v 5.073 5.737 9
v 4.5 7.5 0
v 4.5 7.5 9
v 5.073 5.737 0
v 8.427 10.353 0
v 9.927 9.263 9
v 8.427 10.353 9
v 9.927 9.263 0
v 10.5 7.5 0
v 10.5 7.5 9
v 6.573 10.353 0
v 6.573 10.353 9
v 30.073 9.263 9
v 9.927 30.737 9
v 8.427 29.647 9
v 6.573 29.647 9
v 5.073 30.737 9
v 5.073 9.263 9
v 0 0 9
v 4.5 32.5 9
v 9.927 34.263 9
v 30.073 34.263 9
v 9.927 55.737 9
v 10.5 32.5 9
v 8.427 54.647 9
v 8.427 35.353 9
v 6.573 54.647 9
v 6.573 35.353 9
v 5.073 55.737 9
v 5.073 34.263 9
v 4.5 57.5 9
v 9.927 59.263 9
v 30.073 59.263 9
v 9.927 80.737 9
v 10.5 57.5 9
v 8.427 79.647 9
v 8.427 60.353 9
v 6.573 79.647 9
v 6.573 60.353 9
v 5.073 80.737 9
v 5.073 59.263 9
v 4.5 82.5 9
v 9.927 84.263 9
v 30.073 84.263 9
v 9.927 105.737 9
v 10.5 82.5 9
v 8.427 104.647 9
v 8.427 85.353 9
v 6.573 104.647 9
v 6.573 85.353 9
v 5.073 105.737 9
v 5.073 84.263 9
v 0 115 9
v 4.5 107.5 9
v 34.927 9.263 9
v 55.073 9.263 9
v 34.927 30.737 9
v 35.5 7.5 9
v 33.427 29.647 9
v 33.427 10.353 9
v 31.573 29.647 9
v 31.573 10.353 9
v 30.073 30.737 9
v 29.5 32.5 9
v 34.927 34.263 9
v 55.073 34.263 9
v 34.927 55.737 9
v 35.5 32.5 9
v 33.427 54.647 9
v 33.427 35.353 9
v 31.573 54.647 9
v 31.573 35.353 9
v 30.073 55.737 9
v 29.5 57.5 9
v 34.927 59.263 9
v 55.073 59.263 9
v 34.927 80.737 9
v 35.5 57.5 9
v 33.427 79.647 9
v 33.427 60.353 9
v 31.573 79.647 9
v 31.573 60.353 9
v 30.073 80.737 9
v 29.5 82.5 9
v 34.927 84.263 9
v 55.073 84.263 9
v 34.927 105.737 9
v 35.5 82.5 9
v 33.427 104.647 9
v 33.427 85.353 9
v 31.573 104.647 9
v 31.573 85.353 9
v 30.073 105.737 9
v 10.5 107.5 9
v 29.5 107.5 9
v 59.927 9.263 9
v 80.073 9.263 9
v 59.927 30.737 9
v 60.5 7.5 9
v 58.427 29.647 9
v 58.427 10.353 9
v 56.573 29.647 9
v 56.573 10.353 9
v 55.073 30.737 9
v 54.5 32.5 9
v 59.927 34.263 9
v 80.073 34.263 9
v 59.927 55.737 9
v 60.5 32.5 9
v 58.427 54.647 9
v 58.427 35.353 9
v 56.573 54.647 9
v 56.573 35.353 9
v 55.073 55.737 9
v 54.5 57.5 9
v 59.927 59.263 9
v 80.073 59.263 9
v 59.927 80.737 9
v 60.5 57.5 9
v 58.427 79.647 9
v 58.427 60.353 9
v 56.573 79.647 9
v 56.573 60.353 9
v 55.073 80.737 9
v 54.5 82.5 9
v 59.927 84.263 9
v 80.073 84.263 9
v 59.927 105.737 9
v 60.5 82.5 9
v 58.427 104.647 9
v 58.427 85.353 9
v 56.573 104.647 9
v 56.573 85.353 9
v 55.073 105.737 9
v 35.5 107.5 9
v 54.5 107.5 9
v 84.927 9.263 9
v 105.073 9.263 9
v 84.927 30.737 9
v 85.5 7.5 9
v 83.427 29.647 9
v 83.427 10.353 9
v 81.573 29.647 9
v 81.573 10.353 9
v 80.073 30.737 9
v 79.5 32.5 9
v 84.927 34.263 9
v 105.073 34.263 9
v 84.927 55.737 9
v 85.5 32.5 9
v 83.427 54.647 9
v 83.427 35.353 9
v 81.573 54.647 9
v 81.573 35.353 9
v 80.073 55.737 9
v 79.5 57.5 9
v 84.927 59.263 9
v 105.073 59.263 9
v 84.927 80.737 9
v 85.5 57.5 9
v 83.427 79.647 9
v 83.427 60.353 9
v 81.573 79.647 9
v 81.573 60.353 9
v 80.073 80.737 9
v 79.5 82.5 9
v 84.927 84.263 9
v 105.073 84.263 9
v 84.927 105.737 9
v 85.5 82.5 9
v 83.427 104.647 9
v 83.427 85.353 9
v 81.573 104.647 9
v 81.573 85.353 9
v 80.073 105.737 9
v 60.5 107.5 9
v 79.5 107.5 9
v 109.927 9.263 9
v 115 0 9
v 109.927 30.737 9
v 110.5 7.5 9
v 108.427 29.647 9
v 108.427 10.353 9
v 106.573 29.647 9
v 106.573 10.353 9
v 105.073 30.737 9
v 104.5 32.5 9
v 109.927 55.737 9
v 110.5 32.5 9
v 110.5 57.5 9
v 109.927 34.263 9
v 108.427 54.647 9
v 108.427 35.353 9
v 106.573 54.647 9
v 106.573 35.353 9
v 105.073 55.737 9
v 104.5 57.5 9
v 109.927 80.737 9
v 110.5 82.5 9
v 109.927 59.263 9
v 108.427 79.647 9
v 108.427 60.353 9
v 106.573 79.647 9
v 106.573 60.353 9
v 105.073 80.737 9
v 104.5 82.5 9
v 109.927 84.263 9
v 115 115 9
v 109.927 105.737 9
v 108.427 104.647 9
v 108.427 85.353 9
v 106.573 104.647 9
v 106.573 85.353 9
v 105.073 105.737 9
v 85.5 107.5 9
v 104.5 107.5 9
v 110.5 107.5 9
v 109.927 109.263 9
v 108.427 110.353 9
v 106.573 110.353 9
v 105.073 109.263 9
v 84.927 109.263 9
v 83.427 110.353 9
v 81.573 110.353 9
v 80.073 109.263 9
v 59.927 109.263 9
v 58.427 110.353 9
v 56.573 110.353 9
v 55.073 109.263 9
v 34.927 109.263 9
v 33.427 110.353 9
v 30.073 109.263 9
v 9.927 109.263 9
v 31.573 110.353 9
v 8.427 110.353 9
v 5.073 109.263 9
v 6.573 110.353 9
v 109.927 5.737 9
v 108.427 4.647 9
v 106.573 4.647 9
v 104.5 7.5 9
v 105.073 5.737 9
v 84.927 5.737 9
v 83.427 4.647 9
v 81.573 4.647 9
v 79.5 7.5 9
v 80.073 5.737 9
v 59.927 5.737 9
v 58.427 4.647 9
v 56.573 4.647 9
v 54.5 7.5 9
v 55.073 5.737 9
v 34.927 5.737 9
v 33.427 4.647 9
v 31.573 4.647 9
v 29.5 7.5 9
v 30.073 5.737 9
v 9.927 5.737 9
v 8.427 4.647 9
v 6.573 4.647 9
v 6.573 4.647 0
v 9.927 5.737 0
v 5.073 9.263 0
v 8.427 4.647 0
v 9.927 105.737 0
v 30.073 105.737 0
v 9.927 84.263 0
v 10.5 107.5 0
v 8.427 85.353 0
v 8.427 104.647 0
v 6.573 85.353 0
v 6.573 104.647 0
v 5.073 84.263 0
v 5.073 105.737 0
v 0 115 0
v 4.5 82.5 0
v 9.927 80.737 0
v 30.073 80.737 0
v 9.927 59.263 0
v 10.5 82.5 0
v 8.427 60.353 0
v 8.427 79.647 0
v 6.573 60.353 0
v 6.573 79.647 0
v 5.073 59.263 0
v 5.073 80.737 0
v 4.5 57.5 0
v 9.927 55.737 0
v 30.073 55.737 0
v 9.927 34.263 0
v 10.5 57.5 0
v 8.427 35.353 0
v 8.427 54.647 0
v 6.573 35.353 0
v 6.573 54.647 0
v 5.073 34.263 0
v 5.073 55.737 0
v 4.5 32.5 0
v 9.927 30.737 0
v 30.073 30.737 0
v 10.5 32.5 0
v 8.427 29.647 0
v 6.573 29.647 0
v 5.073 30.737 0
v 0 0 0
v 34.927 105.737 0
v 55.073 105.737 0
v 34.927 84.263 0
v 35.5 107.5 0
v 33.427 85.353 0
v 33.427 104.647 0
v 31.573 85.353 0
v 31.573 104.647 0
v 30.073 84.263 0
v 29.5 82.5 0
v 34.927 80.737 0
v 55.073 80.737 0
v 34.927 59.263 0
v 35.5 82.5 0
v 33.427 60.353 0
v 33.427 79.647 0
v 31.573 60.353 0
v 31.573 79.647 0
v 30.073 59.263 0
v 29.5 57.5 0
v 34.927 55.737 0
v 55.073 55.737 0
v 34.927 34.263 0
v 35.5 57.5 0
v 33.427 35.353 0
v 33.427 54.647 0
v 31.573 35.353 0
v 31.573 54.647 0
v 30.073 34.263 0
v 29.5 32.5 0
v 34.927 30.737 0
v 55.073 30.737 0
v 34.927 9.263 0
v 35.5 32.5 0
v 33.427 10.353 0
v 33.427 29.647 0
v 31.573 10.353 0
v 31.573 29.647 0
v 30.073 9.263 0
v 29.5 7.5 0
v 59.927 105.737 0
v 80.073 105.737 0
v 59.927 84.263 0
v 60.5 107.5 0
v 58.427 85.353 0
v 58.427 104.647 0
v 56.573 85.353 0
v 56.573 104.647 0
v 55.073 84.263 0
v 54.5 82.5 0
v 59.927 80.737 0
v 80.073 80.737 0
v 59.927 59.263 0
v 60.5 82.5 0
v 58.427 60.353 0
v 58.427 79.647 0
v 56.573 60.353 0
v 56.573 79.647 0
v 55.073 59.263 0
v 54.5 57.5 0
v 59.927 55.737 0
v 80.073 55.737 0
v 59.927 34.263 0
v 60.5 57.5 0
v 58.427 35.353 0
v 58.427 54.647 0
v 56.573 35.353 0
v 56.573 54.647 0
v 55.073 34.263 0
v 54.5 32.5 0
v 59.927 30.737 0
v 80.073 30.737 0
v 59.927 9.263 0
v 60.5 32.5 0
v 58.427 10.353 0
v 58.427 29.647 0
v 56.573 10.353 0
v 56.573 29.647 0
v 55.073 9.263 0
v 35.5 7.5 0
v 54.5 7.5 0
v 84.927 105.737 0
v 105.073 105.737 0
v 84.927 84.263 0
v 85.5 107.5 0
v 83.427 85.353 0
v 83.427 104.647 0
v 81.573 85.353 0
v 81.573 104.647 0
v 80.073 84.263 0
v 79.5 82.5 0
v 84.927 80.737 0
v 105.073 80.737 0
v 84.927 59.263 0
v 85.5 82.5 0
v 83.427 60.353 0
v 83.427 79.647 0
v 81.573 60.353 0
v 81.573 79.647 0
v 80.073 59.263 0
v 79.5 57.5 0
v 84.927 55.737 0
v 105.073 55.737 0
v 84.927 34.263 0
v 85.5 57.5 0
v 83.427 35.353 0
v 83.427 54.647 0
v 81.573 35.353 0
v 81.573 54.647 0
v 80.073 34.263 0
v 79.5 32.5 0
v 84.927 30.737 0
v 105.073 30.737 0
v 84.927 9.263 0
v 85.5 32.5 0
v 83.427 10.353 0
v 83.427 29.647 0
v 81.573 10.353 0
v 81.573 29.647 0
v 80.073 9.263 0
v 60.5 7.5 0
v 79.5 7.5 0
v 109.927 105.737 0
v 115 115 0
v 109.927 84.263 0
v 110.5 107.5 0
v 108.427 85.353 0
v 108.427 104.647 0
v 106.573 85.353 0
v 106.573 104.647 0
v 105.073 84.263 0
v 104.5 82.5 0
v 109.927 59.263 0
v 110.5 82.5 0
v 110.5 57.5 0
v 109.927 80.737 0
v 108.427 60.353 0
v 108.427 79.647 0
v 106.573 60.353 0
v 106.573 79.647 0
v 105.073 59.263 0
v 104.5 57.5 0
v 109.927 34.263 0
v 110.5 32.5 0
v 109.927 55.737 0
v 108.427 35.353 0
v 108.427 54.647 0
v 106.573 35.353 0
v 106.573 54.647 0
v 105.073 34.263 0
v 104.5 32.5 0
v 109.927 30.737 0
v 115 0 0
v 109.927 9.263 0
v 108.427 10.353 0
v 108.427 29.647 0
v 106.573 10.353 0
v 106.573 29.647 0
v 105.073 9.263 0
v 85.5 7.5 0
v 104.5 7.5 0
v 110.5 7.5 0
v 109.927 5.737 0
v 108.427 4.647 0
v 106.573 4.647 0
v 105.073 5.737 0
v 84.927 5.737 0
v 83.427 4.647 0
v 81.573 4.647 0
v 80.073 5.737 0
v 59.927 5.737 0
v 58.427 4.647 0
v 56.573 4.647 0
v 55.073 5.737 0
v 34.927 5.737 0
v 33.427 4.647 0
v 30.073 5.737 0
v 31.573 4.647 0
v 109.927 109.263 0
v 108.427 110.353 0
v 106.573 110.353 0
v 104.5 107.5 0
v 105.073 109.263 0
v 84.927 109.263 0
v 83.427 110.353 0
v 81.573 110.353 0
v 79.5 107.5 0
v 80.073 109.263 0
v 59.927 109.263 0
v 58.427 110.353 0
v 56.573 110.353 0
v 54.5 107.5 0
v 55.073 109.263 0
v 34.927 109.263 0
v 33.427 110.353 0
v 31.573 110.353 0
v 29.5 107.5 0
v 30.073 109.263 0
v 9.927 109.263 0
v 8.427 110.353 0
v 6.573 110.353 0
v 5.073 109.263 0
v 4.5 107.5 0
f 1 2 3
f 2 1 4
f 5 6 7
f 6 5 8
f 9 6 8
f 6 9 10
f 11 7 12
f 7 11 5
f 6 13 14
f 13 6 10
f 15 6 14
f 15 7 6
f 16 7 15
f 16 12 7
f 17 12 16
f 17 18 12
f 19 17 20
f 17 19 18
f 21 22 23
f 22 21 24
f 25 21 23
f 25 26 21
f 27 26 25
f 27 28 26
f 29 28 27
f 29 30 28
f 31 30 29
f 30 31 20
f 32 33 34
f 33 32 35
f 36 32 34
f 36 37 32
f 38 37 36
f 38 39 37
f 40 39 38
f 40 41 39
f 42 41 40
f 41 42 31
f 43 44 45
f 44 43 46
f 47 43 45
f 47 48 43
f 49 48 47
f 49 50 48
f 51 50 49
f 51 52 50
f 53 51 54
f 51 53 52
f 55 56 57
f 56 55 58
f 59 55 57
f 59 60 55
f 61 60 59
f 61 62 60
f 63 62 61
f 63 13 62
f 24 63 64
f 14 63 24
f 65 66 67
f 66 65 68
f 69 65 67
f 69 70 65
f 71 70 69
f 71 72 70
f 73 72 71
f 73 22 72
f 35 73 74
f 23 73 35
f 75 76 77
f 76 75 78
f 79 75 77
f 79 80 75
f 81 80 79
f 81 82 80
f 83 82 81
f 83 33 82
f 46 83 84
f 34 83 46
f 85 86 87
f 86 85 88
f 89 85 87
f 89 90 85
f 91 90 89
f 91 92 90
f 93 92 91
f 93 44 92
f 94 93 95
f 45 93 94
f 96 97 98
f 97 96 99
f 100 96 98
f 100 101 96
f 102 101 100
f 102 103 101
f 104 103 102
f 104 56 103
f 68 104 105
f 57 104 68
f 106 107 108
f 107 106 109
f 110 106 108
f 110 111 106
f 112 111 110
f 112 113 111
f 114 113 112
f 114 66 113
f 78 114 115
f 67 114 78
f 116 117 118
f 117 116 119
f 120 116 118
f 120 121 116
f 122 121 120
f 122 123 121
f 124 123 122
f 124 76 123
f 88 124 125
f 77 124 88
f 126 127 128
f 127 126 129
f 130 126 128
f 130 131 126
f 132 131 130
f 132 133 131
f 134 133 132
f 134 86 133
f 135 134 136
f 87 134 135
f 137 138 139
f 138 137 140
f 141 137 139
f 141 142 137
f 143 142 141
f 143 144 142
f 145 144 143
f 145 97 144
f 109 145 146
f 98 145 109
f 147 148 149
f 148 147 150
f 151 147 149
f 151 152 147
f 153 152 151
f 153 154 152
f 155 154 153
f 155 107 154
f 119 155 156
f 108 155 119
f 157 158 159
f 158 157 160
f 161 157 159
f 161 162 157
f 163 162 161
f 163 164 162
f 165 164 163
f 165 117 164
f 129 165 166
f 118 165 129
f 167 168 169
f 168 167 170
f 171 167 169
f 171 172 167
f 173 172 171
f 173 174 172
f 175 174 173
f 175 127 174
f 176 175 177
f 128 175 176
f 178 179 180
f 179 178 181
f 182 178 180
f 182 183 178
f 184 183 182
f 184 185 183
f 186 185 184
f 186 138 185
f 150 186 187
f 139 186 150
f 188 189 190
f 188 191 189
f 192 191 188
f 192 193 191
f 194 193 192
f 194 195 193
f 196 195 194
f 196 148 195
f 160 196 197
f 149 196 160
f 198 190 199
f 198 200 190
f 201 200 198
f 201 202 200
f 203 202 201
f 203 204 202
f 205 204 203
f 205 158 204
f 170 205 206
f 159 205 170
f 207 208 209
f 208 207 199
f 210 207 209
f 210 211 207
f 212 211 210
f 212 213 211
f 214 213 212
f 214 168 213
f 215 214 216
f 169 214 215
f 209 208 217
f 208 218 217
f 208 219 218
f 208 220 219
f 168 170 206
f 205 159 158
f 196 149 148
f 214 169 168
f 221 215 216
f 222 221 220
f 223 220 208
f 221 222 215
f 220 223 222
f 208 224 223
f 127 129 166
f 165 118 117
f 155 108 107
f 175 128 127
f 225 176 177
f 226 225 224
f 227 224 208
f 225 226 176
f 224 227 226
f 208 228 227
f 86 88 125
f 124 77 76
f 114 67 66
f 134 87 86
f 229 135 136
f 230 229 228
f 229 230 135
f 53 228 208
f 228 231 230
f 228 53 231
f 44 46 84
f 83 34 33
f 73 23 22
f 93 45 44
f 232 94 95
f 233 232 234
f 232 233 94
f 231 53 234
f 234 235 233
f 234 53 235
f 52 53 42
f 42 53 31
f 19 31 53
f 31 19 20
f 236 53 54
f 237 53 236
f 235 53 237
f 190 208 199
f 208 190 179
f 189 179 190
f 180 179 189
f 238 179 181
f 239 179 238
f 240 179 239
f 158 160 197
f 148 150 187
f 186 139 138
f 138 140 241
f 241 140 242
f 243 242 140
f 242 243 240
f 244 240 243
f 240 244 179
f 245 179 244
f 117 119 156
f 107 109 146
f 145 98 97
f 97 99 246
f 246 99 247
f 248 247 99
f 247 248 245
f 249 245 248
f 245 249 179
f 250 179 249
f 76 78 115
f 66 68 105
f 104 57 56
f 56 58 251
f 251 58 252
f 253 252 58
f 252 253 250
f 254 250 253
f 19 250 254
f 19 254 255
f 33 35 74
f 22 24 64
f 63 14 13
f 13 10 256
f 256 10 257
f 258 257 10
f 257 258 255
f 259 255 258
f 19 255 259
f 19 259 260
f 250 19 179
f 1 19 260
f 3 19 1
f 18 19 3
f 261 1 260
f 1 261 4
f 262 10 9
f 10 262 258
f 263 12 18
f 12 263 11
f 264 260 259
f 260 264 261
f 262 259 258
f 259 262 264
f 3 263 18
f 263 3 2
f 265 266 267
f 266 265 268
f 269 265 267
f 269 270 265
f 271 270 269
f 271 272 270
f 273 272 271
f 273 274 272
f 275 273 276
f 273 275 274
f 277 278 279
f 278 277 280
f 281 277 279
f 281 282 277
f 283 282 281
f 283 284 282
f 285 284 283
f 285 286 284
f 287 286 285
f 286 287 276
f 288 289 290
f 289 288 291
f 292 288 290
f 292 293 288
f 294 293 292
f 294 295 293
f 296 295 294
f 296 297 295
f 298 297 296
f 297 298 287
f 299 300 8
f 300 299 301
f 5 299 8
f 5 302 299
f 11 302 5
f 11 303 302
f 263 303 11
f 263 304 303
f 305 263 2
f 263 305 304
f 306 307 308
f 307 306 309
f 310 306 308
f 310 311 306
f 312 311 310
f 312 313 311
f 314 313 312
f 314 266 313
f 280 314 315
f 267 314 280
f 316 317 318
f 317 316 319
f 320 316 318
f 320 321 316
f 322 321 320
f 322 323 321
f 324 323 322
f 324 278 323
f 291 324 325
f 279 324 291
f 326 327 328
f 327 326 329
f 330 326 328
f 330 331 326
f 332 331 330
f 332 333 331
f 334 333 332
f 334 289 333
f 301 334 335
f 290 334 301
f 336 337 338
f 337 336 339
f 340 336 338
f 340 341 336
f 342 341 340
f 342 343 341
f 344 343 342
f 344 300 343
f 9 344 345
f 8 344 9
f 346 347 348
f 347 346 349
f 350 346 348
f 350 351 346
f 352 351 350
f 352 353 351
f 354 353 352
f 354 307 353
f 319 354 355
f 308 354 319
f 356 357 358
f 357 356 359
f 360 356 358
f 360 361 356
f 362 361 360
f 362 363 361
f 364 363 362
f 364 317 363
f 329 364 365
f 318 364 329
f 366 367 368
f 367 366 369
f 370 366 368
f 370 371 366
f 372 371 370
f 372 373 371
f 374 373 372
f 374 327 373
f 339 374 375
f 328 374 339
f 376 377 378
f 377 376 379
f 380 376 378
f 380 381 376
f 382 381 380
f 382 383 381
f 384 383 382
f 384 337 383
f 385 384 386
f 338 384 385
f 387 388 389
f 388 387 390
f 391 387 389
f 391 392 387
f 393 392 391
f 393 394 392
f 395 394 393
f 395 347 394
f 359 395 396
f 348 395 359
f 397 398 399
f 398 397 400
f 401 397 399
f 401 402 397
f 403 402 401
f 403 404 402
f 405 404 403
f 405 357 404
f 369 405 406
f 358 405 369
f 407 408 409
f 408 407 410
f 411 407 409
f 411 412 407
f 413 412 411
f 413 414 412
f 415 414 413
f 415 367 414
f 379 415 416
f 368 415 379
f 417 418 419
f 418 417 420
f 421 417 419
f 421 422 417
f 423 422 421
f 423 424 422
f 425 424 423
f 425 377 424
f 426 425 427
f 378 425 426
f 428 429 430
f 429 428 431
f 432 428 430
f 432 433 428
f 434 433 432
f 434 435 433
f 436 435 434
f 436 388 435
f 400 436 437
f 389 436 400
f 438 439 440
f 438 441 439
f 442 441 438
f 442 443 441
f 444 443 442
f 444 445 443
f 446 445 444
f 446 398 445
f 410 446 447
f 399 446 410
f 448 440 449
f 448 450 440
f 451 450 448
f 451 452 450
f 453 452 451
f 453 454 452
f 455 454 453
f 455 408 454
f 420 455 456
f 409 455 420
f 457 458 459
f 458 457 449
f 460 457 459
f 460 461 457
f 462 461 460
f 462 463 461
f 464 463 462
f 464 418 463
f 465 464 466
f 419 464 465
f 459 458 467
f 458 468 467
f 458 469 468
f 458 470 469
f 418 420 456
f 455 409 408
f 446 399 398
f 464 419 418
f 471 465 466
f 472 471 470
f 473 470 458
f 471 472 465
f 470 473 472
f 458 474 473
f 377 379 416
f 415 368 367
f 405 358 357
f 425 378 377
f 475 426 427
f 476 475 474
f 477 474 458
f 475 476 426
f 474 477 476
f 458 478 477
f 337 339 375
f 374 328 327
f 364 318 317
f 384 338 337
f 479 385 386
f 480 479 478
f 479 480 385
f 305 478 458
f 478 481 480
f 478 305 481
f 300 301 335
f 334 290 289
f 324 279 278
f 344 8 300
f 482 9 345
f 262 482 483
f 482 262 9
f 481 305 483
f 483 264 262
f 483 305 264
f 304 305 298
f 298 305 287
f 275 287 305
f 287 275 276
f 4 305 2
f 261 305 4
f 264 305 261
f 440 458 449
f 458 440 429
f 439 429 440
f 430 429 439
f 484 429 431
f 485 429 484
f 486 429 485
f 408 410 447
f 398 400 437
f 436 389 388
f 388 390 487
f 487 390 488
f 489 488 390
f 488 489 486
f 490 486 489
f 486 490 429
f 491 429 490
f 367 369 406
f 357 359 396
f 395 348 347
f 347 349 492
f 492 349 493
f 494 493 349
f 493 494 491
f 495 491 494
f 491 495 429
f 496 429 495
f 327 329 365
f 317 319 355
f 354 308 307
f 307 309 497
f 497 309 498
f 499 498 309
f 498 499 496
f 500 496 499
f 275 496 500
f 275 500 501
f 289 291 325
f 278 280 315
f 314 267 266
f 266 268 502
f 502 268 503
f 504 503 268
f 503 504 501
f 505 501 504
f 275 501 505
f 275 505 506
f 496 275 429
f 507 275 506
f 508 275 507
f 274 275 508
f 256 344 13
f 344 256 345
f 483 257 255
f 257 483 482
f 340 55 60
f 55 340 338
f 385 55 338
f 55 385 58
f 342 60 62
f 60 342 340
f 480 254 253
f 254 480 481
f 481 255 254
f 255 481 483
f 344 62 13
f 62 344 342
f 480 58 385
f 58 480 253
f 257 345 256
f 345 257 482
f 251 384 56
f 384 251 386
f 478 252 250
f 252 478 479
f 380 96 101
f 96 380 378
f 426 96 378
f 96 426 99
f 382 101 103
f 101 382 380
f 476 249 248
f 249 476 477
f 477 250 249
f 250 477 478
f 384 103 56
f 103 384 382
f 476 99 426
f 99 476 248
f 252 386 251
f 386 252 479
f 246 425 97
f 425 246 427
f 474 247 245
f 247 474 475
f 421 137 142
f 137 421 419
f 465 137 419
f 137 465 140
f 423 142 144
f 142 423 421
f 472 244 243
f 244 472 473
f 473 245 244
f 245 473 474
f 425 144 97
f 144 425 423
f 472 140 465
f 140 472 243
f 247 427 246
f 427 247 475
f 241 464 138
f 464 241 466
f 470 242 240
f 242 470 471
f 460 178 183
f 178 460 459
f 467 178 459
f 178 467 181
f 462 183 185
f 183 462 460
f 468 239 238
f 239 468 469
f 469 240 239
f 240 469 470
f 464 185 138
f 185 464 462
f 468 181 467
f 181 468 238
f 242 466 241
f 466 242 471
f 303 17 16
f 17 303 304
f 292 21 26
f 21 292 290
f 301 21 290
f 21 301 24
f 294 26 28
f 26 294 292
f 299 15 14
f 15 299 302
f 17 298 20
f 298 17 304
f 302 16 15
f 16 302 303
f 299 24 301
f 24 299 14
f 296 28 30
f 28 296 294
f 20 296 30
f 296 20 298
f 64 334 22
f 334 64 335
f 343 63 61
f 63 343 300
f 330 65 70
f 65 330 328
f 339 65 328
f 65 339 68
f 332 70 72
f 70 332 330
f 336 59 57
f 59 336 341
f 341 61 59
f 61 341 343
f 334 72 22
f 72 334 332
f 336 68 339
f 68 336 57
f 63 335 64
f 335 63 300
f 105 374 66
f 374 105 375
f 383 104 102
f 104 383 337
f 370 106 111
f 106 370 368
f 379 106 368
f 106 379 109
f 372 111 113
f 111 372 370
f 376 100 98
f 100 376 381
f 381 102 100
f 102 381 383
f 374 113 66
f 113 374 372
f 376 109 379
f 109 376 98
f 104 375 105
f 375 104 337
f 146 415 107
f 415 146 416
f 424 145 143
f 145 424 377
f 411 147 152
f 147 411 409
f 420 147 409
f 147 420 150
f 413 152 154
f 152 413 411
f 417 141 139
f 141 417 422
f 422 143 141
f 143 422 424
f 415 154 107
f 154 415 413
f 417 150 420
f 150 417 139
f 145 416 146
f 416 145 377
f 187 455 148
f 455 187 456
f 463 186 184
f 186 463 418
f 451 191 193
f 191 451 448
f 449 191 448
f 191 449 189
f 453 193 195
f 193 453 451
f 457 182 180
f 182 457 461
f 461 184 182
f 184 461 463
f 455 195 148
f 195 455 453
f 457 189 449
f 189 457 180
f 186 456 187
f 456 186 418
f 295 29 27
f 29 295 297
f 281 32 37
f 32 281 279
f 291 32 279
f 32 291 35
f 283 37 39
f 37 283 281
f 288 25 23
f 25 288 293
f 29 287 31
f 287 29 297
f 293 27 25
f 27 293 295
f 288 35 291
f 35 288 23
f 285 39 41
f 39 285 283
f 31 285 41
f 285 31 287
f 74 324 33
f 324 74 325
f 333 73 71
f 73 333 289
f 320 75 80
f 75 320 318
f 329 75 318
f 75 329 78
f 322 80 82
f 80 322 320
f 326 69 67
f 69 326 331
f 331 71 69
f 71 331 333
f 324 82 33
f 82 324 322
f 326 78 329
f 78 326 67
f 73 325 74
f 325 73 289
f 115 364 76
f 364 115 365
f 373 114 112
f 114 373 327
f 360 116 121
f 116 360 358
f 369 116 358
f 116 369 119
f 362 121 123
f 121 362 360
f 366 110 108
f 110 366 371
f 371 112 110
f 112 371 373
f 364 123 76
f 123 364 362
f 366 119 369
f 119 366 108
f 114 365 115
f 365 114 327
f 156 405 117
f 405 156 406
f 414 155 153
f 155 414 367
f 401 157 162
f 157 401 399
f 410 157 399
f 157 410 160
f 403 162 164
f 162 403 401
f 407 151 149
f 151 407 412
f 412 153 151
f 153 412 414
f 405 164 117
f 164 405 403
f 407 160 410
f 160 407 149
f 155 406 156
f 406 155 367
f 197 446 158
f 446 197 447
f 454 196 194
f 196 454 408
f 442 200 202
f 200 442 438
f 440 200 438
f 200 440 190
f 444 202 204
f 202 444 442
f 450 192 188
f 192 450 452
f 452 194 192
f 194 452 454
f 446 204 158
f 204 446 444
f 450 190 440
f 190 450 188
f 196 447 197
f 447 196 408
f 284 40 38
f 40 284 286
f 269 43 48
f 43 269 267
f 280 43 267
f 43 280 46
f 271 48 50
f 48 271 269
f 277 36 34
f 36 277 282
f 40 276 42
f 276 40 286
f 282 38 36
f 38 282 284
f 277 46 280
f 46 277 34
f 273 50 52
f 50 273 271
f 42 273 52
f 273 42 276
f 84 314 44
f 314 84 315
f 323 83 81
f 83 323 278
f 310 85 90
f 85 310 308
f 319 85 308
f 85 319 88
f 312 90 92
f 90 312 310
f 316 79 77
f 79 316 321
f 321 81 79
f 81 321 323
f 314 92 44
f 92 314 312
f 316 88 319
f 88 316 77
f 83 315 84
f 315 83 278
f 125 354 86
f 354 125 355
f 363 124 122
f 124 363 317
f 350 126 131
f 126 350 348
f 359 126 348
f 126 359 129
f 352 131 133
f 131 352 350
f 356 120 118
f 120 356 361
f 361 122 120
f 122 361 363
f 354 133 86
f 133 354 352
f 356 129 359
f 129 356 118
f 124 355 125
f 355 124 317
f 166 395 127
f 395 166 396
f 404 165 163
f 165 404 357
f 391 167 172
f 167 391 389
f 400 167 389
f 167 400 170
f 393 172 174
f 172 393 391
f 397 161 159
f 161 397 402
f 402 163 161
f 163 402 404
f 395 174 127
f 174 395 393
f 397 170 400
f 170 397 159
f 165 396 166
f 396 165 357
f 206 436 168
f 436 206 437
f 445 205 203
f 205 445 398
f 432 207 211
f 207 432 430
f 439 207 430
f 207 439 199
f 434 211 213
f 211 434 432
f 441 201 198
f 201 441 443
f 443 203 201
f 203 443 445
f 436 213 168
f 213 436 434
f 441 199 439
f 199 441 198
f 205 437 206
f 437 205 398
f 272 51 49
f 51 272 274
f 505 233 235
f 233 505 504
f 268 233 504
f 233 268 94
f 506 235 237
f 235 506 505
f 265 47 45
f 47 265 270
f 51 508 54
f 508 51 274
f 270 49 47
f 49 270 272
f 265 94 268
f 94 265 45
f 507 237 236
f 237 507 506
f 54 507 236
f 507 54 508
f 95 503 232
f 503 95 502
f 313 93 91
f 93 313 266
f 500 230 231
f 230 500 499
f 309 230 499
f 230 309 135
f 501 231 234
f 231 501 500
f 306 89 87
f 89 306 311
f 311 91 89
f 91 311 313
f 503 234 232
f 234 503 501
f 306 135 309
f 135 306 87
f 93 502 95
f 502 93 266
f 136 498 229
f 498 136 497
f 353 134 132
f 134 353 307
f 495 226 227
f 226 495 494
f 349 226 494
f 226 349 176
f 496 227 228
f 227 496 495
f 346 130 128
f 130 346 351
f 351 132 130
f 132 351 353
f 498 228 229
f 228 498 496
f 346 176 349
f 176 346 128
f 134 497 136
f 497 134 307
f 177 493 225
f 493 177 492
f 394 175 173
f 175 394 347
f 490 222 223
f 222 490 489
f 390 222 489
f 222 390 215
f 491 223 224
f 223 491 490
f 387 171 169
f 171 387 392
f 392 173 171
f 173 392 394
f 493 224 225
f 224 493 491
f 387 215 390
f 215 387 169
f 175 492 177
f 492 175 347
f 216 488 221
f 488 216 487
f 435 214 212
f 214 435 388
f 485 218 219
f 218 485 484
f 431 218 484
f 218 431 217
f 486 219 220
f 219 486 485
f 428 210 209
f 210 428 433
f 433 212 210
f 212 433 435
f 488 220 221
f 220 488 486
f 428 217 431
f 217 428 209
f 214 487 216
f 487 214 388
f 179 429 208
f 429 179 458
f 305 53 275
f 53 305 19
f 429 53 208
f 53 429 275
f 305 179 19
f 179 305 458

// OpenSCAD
//-----Base Óptica-----//

//-----Declaração de Variáveis-----//
r=3;
d=25;
h=9;
nx=5;
ny=5;
geo=1;
res=10;
aux=2*d+15.15;
aux2=40.7-24.2+111.70-16.7-5.15/2;
aux3=11/2;
aux4=(37.55+4)/2 - (16.35+5.1/2-13.2);
cc=25;
ff=37.5;
gg=0.2;
shift=(17.5+2*d)/2;
shift2=(17.5)/2;
h_alt=11/2;
hip=h_alt/(sin(60));
o_ext=d*0.75+2*shift; // Segundo rabo de andorinha
o_ext2=2*shift2+d*0.75; //Primeiro rabo de andorinha

//-----Declaração de Funções-----//
module funcao_2d_array_cilindros(r,d,h,nx,ny,geo,res){
    //-----FUNÇÃO ARRAY 2D DE CILÍNDROS-----//
    /*
    Forneça:
        raio dos cilíndros: r
        distância entre os centros de cada cilíndro: d
        altura dos cilíndros: h
        quantidade de cilíndros em ambas as direções: nx, ny
        resolução dos cilíndros: res
    Selecione a geometria:
         Retangular: 1
         Hexagonal: 2
    
    Quantidade de cilíndros = nx*ny
    geo=1 => Dimensões: [(nx-1)*d+2*r,(ny-1)*d+2*r,h]
    geo=2 => Dimensões: [(nx-1+cos(60))*d+2*r,(ny-1)*d*sin(60)+2*r,h]
    */
    if (d<2*r){
        text("Error!");
        translate([0,-15,0])text("Verify your specified dimensions.");
    }else{
        if(geo==1){
            for(j=[0:1:ny-1]){
                for(i=[0:1:nx-1]){
                    translate([i*d,j*d,0])cylinder(h,r,r,$fn=res);
                }
            }
        }else if(geo==2){
            for(j=[0:1:ny-1]){
                for(i=[0:1:nx-1]){
                    translate([i*d+(j%2)*d*cos(60),j*d*sin(60),0])cylinder(h,r,r,$fn=res);
                }
            }
        }else{
            text("Error!");
            translate([0,-15,0])text("Please, choose a valid geometry number.");
        }
        
    }    
}

//-----Base Óptica-----//
difference(){
    cube([4*d+15,4*d+15,9]);
    #translate([15/2,15/2,0])funcao_2d_array_cilindros(r,d,h,nx,ny,geo,res);
}
